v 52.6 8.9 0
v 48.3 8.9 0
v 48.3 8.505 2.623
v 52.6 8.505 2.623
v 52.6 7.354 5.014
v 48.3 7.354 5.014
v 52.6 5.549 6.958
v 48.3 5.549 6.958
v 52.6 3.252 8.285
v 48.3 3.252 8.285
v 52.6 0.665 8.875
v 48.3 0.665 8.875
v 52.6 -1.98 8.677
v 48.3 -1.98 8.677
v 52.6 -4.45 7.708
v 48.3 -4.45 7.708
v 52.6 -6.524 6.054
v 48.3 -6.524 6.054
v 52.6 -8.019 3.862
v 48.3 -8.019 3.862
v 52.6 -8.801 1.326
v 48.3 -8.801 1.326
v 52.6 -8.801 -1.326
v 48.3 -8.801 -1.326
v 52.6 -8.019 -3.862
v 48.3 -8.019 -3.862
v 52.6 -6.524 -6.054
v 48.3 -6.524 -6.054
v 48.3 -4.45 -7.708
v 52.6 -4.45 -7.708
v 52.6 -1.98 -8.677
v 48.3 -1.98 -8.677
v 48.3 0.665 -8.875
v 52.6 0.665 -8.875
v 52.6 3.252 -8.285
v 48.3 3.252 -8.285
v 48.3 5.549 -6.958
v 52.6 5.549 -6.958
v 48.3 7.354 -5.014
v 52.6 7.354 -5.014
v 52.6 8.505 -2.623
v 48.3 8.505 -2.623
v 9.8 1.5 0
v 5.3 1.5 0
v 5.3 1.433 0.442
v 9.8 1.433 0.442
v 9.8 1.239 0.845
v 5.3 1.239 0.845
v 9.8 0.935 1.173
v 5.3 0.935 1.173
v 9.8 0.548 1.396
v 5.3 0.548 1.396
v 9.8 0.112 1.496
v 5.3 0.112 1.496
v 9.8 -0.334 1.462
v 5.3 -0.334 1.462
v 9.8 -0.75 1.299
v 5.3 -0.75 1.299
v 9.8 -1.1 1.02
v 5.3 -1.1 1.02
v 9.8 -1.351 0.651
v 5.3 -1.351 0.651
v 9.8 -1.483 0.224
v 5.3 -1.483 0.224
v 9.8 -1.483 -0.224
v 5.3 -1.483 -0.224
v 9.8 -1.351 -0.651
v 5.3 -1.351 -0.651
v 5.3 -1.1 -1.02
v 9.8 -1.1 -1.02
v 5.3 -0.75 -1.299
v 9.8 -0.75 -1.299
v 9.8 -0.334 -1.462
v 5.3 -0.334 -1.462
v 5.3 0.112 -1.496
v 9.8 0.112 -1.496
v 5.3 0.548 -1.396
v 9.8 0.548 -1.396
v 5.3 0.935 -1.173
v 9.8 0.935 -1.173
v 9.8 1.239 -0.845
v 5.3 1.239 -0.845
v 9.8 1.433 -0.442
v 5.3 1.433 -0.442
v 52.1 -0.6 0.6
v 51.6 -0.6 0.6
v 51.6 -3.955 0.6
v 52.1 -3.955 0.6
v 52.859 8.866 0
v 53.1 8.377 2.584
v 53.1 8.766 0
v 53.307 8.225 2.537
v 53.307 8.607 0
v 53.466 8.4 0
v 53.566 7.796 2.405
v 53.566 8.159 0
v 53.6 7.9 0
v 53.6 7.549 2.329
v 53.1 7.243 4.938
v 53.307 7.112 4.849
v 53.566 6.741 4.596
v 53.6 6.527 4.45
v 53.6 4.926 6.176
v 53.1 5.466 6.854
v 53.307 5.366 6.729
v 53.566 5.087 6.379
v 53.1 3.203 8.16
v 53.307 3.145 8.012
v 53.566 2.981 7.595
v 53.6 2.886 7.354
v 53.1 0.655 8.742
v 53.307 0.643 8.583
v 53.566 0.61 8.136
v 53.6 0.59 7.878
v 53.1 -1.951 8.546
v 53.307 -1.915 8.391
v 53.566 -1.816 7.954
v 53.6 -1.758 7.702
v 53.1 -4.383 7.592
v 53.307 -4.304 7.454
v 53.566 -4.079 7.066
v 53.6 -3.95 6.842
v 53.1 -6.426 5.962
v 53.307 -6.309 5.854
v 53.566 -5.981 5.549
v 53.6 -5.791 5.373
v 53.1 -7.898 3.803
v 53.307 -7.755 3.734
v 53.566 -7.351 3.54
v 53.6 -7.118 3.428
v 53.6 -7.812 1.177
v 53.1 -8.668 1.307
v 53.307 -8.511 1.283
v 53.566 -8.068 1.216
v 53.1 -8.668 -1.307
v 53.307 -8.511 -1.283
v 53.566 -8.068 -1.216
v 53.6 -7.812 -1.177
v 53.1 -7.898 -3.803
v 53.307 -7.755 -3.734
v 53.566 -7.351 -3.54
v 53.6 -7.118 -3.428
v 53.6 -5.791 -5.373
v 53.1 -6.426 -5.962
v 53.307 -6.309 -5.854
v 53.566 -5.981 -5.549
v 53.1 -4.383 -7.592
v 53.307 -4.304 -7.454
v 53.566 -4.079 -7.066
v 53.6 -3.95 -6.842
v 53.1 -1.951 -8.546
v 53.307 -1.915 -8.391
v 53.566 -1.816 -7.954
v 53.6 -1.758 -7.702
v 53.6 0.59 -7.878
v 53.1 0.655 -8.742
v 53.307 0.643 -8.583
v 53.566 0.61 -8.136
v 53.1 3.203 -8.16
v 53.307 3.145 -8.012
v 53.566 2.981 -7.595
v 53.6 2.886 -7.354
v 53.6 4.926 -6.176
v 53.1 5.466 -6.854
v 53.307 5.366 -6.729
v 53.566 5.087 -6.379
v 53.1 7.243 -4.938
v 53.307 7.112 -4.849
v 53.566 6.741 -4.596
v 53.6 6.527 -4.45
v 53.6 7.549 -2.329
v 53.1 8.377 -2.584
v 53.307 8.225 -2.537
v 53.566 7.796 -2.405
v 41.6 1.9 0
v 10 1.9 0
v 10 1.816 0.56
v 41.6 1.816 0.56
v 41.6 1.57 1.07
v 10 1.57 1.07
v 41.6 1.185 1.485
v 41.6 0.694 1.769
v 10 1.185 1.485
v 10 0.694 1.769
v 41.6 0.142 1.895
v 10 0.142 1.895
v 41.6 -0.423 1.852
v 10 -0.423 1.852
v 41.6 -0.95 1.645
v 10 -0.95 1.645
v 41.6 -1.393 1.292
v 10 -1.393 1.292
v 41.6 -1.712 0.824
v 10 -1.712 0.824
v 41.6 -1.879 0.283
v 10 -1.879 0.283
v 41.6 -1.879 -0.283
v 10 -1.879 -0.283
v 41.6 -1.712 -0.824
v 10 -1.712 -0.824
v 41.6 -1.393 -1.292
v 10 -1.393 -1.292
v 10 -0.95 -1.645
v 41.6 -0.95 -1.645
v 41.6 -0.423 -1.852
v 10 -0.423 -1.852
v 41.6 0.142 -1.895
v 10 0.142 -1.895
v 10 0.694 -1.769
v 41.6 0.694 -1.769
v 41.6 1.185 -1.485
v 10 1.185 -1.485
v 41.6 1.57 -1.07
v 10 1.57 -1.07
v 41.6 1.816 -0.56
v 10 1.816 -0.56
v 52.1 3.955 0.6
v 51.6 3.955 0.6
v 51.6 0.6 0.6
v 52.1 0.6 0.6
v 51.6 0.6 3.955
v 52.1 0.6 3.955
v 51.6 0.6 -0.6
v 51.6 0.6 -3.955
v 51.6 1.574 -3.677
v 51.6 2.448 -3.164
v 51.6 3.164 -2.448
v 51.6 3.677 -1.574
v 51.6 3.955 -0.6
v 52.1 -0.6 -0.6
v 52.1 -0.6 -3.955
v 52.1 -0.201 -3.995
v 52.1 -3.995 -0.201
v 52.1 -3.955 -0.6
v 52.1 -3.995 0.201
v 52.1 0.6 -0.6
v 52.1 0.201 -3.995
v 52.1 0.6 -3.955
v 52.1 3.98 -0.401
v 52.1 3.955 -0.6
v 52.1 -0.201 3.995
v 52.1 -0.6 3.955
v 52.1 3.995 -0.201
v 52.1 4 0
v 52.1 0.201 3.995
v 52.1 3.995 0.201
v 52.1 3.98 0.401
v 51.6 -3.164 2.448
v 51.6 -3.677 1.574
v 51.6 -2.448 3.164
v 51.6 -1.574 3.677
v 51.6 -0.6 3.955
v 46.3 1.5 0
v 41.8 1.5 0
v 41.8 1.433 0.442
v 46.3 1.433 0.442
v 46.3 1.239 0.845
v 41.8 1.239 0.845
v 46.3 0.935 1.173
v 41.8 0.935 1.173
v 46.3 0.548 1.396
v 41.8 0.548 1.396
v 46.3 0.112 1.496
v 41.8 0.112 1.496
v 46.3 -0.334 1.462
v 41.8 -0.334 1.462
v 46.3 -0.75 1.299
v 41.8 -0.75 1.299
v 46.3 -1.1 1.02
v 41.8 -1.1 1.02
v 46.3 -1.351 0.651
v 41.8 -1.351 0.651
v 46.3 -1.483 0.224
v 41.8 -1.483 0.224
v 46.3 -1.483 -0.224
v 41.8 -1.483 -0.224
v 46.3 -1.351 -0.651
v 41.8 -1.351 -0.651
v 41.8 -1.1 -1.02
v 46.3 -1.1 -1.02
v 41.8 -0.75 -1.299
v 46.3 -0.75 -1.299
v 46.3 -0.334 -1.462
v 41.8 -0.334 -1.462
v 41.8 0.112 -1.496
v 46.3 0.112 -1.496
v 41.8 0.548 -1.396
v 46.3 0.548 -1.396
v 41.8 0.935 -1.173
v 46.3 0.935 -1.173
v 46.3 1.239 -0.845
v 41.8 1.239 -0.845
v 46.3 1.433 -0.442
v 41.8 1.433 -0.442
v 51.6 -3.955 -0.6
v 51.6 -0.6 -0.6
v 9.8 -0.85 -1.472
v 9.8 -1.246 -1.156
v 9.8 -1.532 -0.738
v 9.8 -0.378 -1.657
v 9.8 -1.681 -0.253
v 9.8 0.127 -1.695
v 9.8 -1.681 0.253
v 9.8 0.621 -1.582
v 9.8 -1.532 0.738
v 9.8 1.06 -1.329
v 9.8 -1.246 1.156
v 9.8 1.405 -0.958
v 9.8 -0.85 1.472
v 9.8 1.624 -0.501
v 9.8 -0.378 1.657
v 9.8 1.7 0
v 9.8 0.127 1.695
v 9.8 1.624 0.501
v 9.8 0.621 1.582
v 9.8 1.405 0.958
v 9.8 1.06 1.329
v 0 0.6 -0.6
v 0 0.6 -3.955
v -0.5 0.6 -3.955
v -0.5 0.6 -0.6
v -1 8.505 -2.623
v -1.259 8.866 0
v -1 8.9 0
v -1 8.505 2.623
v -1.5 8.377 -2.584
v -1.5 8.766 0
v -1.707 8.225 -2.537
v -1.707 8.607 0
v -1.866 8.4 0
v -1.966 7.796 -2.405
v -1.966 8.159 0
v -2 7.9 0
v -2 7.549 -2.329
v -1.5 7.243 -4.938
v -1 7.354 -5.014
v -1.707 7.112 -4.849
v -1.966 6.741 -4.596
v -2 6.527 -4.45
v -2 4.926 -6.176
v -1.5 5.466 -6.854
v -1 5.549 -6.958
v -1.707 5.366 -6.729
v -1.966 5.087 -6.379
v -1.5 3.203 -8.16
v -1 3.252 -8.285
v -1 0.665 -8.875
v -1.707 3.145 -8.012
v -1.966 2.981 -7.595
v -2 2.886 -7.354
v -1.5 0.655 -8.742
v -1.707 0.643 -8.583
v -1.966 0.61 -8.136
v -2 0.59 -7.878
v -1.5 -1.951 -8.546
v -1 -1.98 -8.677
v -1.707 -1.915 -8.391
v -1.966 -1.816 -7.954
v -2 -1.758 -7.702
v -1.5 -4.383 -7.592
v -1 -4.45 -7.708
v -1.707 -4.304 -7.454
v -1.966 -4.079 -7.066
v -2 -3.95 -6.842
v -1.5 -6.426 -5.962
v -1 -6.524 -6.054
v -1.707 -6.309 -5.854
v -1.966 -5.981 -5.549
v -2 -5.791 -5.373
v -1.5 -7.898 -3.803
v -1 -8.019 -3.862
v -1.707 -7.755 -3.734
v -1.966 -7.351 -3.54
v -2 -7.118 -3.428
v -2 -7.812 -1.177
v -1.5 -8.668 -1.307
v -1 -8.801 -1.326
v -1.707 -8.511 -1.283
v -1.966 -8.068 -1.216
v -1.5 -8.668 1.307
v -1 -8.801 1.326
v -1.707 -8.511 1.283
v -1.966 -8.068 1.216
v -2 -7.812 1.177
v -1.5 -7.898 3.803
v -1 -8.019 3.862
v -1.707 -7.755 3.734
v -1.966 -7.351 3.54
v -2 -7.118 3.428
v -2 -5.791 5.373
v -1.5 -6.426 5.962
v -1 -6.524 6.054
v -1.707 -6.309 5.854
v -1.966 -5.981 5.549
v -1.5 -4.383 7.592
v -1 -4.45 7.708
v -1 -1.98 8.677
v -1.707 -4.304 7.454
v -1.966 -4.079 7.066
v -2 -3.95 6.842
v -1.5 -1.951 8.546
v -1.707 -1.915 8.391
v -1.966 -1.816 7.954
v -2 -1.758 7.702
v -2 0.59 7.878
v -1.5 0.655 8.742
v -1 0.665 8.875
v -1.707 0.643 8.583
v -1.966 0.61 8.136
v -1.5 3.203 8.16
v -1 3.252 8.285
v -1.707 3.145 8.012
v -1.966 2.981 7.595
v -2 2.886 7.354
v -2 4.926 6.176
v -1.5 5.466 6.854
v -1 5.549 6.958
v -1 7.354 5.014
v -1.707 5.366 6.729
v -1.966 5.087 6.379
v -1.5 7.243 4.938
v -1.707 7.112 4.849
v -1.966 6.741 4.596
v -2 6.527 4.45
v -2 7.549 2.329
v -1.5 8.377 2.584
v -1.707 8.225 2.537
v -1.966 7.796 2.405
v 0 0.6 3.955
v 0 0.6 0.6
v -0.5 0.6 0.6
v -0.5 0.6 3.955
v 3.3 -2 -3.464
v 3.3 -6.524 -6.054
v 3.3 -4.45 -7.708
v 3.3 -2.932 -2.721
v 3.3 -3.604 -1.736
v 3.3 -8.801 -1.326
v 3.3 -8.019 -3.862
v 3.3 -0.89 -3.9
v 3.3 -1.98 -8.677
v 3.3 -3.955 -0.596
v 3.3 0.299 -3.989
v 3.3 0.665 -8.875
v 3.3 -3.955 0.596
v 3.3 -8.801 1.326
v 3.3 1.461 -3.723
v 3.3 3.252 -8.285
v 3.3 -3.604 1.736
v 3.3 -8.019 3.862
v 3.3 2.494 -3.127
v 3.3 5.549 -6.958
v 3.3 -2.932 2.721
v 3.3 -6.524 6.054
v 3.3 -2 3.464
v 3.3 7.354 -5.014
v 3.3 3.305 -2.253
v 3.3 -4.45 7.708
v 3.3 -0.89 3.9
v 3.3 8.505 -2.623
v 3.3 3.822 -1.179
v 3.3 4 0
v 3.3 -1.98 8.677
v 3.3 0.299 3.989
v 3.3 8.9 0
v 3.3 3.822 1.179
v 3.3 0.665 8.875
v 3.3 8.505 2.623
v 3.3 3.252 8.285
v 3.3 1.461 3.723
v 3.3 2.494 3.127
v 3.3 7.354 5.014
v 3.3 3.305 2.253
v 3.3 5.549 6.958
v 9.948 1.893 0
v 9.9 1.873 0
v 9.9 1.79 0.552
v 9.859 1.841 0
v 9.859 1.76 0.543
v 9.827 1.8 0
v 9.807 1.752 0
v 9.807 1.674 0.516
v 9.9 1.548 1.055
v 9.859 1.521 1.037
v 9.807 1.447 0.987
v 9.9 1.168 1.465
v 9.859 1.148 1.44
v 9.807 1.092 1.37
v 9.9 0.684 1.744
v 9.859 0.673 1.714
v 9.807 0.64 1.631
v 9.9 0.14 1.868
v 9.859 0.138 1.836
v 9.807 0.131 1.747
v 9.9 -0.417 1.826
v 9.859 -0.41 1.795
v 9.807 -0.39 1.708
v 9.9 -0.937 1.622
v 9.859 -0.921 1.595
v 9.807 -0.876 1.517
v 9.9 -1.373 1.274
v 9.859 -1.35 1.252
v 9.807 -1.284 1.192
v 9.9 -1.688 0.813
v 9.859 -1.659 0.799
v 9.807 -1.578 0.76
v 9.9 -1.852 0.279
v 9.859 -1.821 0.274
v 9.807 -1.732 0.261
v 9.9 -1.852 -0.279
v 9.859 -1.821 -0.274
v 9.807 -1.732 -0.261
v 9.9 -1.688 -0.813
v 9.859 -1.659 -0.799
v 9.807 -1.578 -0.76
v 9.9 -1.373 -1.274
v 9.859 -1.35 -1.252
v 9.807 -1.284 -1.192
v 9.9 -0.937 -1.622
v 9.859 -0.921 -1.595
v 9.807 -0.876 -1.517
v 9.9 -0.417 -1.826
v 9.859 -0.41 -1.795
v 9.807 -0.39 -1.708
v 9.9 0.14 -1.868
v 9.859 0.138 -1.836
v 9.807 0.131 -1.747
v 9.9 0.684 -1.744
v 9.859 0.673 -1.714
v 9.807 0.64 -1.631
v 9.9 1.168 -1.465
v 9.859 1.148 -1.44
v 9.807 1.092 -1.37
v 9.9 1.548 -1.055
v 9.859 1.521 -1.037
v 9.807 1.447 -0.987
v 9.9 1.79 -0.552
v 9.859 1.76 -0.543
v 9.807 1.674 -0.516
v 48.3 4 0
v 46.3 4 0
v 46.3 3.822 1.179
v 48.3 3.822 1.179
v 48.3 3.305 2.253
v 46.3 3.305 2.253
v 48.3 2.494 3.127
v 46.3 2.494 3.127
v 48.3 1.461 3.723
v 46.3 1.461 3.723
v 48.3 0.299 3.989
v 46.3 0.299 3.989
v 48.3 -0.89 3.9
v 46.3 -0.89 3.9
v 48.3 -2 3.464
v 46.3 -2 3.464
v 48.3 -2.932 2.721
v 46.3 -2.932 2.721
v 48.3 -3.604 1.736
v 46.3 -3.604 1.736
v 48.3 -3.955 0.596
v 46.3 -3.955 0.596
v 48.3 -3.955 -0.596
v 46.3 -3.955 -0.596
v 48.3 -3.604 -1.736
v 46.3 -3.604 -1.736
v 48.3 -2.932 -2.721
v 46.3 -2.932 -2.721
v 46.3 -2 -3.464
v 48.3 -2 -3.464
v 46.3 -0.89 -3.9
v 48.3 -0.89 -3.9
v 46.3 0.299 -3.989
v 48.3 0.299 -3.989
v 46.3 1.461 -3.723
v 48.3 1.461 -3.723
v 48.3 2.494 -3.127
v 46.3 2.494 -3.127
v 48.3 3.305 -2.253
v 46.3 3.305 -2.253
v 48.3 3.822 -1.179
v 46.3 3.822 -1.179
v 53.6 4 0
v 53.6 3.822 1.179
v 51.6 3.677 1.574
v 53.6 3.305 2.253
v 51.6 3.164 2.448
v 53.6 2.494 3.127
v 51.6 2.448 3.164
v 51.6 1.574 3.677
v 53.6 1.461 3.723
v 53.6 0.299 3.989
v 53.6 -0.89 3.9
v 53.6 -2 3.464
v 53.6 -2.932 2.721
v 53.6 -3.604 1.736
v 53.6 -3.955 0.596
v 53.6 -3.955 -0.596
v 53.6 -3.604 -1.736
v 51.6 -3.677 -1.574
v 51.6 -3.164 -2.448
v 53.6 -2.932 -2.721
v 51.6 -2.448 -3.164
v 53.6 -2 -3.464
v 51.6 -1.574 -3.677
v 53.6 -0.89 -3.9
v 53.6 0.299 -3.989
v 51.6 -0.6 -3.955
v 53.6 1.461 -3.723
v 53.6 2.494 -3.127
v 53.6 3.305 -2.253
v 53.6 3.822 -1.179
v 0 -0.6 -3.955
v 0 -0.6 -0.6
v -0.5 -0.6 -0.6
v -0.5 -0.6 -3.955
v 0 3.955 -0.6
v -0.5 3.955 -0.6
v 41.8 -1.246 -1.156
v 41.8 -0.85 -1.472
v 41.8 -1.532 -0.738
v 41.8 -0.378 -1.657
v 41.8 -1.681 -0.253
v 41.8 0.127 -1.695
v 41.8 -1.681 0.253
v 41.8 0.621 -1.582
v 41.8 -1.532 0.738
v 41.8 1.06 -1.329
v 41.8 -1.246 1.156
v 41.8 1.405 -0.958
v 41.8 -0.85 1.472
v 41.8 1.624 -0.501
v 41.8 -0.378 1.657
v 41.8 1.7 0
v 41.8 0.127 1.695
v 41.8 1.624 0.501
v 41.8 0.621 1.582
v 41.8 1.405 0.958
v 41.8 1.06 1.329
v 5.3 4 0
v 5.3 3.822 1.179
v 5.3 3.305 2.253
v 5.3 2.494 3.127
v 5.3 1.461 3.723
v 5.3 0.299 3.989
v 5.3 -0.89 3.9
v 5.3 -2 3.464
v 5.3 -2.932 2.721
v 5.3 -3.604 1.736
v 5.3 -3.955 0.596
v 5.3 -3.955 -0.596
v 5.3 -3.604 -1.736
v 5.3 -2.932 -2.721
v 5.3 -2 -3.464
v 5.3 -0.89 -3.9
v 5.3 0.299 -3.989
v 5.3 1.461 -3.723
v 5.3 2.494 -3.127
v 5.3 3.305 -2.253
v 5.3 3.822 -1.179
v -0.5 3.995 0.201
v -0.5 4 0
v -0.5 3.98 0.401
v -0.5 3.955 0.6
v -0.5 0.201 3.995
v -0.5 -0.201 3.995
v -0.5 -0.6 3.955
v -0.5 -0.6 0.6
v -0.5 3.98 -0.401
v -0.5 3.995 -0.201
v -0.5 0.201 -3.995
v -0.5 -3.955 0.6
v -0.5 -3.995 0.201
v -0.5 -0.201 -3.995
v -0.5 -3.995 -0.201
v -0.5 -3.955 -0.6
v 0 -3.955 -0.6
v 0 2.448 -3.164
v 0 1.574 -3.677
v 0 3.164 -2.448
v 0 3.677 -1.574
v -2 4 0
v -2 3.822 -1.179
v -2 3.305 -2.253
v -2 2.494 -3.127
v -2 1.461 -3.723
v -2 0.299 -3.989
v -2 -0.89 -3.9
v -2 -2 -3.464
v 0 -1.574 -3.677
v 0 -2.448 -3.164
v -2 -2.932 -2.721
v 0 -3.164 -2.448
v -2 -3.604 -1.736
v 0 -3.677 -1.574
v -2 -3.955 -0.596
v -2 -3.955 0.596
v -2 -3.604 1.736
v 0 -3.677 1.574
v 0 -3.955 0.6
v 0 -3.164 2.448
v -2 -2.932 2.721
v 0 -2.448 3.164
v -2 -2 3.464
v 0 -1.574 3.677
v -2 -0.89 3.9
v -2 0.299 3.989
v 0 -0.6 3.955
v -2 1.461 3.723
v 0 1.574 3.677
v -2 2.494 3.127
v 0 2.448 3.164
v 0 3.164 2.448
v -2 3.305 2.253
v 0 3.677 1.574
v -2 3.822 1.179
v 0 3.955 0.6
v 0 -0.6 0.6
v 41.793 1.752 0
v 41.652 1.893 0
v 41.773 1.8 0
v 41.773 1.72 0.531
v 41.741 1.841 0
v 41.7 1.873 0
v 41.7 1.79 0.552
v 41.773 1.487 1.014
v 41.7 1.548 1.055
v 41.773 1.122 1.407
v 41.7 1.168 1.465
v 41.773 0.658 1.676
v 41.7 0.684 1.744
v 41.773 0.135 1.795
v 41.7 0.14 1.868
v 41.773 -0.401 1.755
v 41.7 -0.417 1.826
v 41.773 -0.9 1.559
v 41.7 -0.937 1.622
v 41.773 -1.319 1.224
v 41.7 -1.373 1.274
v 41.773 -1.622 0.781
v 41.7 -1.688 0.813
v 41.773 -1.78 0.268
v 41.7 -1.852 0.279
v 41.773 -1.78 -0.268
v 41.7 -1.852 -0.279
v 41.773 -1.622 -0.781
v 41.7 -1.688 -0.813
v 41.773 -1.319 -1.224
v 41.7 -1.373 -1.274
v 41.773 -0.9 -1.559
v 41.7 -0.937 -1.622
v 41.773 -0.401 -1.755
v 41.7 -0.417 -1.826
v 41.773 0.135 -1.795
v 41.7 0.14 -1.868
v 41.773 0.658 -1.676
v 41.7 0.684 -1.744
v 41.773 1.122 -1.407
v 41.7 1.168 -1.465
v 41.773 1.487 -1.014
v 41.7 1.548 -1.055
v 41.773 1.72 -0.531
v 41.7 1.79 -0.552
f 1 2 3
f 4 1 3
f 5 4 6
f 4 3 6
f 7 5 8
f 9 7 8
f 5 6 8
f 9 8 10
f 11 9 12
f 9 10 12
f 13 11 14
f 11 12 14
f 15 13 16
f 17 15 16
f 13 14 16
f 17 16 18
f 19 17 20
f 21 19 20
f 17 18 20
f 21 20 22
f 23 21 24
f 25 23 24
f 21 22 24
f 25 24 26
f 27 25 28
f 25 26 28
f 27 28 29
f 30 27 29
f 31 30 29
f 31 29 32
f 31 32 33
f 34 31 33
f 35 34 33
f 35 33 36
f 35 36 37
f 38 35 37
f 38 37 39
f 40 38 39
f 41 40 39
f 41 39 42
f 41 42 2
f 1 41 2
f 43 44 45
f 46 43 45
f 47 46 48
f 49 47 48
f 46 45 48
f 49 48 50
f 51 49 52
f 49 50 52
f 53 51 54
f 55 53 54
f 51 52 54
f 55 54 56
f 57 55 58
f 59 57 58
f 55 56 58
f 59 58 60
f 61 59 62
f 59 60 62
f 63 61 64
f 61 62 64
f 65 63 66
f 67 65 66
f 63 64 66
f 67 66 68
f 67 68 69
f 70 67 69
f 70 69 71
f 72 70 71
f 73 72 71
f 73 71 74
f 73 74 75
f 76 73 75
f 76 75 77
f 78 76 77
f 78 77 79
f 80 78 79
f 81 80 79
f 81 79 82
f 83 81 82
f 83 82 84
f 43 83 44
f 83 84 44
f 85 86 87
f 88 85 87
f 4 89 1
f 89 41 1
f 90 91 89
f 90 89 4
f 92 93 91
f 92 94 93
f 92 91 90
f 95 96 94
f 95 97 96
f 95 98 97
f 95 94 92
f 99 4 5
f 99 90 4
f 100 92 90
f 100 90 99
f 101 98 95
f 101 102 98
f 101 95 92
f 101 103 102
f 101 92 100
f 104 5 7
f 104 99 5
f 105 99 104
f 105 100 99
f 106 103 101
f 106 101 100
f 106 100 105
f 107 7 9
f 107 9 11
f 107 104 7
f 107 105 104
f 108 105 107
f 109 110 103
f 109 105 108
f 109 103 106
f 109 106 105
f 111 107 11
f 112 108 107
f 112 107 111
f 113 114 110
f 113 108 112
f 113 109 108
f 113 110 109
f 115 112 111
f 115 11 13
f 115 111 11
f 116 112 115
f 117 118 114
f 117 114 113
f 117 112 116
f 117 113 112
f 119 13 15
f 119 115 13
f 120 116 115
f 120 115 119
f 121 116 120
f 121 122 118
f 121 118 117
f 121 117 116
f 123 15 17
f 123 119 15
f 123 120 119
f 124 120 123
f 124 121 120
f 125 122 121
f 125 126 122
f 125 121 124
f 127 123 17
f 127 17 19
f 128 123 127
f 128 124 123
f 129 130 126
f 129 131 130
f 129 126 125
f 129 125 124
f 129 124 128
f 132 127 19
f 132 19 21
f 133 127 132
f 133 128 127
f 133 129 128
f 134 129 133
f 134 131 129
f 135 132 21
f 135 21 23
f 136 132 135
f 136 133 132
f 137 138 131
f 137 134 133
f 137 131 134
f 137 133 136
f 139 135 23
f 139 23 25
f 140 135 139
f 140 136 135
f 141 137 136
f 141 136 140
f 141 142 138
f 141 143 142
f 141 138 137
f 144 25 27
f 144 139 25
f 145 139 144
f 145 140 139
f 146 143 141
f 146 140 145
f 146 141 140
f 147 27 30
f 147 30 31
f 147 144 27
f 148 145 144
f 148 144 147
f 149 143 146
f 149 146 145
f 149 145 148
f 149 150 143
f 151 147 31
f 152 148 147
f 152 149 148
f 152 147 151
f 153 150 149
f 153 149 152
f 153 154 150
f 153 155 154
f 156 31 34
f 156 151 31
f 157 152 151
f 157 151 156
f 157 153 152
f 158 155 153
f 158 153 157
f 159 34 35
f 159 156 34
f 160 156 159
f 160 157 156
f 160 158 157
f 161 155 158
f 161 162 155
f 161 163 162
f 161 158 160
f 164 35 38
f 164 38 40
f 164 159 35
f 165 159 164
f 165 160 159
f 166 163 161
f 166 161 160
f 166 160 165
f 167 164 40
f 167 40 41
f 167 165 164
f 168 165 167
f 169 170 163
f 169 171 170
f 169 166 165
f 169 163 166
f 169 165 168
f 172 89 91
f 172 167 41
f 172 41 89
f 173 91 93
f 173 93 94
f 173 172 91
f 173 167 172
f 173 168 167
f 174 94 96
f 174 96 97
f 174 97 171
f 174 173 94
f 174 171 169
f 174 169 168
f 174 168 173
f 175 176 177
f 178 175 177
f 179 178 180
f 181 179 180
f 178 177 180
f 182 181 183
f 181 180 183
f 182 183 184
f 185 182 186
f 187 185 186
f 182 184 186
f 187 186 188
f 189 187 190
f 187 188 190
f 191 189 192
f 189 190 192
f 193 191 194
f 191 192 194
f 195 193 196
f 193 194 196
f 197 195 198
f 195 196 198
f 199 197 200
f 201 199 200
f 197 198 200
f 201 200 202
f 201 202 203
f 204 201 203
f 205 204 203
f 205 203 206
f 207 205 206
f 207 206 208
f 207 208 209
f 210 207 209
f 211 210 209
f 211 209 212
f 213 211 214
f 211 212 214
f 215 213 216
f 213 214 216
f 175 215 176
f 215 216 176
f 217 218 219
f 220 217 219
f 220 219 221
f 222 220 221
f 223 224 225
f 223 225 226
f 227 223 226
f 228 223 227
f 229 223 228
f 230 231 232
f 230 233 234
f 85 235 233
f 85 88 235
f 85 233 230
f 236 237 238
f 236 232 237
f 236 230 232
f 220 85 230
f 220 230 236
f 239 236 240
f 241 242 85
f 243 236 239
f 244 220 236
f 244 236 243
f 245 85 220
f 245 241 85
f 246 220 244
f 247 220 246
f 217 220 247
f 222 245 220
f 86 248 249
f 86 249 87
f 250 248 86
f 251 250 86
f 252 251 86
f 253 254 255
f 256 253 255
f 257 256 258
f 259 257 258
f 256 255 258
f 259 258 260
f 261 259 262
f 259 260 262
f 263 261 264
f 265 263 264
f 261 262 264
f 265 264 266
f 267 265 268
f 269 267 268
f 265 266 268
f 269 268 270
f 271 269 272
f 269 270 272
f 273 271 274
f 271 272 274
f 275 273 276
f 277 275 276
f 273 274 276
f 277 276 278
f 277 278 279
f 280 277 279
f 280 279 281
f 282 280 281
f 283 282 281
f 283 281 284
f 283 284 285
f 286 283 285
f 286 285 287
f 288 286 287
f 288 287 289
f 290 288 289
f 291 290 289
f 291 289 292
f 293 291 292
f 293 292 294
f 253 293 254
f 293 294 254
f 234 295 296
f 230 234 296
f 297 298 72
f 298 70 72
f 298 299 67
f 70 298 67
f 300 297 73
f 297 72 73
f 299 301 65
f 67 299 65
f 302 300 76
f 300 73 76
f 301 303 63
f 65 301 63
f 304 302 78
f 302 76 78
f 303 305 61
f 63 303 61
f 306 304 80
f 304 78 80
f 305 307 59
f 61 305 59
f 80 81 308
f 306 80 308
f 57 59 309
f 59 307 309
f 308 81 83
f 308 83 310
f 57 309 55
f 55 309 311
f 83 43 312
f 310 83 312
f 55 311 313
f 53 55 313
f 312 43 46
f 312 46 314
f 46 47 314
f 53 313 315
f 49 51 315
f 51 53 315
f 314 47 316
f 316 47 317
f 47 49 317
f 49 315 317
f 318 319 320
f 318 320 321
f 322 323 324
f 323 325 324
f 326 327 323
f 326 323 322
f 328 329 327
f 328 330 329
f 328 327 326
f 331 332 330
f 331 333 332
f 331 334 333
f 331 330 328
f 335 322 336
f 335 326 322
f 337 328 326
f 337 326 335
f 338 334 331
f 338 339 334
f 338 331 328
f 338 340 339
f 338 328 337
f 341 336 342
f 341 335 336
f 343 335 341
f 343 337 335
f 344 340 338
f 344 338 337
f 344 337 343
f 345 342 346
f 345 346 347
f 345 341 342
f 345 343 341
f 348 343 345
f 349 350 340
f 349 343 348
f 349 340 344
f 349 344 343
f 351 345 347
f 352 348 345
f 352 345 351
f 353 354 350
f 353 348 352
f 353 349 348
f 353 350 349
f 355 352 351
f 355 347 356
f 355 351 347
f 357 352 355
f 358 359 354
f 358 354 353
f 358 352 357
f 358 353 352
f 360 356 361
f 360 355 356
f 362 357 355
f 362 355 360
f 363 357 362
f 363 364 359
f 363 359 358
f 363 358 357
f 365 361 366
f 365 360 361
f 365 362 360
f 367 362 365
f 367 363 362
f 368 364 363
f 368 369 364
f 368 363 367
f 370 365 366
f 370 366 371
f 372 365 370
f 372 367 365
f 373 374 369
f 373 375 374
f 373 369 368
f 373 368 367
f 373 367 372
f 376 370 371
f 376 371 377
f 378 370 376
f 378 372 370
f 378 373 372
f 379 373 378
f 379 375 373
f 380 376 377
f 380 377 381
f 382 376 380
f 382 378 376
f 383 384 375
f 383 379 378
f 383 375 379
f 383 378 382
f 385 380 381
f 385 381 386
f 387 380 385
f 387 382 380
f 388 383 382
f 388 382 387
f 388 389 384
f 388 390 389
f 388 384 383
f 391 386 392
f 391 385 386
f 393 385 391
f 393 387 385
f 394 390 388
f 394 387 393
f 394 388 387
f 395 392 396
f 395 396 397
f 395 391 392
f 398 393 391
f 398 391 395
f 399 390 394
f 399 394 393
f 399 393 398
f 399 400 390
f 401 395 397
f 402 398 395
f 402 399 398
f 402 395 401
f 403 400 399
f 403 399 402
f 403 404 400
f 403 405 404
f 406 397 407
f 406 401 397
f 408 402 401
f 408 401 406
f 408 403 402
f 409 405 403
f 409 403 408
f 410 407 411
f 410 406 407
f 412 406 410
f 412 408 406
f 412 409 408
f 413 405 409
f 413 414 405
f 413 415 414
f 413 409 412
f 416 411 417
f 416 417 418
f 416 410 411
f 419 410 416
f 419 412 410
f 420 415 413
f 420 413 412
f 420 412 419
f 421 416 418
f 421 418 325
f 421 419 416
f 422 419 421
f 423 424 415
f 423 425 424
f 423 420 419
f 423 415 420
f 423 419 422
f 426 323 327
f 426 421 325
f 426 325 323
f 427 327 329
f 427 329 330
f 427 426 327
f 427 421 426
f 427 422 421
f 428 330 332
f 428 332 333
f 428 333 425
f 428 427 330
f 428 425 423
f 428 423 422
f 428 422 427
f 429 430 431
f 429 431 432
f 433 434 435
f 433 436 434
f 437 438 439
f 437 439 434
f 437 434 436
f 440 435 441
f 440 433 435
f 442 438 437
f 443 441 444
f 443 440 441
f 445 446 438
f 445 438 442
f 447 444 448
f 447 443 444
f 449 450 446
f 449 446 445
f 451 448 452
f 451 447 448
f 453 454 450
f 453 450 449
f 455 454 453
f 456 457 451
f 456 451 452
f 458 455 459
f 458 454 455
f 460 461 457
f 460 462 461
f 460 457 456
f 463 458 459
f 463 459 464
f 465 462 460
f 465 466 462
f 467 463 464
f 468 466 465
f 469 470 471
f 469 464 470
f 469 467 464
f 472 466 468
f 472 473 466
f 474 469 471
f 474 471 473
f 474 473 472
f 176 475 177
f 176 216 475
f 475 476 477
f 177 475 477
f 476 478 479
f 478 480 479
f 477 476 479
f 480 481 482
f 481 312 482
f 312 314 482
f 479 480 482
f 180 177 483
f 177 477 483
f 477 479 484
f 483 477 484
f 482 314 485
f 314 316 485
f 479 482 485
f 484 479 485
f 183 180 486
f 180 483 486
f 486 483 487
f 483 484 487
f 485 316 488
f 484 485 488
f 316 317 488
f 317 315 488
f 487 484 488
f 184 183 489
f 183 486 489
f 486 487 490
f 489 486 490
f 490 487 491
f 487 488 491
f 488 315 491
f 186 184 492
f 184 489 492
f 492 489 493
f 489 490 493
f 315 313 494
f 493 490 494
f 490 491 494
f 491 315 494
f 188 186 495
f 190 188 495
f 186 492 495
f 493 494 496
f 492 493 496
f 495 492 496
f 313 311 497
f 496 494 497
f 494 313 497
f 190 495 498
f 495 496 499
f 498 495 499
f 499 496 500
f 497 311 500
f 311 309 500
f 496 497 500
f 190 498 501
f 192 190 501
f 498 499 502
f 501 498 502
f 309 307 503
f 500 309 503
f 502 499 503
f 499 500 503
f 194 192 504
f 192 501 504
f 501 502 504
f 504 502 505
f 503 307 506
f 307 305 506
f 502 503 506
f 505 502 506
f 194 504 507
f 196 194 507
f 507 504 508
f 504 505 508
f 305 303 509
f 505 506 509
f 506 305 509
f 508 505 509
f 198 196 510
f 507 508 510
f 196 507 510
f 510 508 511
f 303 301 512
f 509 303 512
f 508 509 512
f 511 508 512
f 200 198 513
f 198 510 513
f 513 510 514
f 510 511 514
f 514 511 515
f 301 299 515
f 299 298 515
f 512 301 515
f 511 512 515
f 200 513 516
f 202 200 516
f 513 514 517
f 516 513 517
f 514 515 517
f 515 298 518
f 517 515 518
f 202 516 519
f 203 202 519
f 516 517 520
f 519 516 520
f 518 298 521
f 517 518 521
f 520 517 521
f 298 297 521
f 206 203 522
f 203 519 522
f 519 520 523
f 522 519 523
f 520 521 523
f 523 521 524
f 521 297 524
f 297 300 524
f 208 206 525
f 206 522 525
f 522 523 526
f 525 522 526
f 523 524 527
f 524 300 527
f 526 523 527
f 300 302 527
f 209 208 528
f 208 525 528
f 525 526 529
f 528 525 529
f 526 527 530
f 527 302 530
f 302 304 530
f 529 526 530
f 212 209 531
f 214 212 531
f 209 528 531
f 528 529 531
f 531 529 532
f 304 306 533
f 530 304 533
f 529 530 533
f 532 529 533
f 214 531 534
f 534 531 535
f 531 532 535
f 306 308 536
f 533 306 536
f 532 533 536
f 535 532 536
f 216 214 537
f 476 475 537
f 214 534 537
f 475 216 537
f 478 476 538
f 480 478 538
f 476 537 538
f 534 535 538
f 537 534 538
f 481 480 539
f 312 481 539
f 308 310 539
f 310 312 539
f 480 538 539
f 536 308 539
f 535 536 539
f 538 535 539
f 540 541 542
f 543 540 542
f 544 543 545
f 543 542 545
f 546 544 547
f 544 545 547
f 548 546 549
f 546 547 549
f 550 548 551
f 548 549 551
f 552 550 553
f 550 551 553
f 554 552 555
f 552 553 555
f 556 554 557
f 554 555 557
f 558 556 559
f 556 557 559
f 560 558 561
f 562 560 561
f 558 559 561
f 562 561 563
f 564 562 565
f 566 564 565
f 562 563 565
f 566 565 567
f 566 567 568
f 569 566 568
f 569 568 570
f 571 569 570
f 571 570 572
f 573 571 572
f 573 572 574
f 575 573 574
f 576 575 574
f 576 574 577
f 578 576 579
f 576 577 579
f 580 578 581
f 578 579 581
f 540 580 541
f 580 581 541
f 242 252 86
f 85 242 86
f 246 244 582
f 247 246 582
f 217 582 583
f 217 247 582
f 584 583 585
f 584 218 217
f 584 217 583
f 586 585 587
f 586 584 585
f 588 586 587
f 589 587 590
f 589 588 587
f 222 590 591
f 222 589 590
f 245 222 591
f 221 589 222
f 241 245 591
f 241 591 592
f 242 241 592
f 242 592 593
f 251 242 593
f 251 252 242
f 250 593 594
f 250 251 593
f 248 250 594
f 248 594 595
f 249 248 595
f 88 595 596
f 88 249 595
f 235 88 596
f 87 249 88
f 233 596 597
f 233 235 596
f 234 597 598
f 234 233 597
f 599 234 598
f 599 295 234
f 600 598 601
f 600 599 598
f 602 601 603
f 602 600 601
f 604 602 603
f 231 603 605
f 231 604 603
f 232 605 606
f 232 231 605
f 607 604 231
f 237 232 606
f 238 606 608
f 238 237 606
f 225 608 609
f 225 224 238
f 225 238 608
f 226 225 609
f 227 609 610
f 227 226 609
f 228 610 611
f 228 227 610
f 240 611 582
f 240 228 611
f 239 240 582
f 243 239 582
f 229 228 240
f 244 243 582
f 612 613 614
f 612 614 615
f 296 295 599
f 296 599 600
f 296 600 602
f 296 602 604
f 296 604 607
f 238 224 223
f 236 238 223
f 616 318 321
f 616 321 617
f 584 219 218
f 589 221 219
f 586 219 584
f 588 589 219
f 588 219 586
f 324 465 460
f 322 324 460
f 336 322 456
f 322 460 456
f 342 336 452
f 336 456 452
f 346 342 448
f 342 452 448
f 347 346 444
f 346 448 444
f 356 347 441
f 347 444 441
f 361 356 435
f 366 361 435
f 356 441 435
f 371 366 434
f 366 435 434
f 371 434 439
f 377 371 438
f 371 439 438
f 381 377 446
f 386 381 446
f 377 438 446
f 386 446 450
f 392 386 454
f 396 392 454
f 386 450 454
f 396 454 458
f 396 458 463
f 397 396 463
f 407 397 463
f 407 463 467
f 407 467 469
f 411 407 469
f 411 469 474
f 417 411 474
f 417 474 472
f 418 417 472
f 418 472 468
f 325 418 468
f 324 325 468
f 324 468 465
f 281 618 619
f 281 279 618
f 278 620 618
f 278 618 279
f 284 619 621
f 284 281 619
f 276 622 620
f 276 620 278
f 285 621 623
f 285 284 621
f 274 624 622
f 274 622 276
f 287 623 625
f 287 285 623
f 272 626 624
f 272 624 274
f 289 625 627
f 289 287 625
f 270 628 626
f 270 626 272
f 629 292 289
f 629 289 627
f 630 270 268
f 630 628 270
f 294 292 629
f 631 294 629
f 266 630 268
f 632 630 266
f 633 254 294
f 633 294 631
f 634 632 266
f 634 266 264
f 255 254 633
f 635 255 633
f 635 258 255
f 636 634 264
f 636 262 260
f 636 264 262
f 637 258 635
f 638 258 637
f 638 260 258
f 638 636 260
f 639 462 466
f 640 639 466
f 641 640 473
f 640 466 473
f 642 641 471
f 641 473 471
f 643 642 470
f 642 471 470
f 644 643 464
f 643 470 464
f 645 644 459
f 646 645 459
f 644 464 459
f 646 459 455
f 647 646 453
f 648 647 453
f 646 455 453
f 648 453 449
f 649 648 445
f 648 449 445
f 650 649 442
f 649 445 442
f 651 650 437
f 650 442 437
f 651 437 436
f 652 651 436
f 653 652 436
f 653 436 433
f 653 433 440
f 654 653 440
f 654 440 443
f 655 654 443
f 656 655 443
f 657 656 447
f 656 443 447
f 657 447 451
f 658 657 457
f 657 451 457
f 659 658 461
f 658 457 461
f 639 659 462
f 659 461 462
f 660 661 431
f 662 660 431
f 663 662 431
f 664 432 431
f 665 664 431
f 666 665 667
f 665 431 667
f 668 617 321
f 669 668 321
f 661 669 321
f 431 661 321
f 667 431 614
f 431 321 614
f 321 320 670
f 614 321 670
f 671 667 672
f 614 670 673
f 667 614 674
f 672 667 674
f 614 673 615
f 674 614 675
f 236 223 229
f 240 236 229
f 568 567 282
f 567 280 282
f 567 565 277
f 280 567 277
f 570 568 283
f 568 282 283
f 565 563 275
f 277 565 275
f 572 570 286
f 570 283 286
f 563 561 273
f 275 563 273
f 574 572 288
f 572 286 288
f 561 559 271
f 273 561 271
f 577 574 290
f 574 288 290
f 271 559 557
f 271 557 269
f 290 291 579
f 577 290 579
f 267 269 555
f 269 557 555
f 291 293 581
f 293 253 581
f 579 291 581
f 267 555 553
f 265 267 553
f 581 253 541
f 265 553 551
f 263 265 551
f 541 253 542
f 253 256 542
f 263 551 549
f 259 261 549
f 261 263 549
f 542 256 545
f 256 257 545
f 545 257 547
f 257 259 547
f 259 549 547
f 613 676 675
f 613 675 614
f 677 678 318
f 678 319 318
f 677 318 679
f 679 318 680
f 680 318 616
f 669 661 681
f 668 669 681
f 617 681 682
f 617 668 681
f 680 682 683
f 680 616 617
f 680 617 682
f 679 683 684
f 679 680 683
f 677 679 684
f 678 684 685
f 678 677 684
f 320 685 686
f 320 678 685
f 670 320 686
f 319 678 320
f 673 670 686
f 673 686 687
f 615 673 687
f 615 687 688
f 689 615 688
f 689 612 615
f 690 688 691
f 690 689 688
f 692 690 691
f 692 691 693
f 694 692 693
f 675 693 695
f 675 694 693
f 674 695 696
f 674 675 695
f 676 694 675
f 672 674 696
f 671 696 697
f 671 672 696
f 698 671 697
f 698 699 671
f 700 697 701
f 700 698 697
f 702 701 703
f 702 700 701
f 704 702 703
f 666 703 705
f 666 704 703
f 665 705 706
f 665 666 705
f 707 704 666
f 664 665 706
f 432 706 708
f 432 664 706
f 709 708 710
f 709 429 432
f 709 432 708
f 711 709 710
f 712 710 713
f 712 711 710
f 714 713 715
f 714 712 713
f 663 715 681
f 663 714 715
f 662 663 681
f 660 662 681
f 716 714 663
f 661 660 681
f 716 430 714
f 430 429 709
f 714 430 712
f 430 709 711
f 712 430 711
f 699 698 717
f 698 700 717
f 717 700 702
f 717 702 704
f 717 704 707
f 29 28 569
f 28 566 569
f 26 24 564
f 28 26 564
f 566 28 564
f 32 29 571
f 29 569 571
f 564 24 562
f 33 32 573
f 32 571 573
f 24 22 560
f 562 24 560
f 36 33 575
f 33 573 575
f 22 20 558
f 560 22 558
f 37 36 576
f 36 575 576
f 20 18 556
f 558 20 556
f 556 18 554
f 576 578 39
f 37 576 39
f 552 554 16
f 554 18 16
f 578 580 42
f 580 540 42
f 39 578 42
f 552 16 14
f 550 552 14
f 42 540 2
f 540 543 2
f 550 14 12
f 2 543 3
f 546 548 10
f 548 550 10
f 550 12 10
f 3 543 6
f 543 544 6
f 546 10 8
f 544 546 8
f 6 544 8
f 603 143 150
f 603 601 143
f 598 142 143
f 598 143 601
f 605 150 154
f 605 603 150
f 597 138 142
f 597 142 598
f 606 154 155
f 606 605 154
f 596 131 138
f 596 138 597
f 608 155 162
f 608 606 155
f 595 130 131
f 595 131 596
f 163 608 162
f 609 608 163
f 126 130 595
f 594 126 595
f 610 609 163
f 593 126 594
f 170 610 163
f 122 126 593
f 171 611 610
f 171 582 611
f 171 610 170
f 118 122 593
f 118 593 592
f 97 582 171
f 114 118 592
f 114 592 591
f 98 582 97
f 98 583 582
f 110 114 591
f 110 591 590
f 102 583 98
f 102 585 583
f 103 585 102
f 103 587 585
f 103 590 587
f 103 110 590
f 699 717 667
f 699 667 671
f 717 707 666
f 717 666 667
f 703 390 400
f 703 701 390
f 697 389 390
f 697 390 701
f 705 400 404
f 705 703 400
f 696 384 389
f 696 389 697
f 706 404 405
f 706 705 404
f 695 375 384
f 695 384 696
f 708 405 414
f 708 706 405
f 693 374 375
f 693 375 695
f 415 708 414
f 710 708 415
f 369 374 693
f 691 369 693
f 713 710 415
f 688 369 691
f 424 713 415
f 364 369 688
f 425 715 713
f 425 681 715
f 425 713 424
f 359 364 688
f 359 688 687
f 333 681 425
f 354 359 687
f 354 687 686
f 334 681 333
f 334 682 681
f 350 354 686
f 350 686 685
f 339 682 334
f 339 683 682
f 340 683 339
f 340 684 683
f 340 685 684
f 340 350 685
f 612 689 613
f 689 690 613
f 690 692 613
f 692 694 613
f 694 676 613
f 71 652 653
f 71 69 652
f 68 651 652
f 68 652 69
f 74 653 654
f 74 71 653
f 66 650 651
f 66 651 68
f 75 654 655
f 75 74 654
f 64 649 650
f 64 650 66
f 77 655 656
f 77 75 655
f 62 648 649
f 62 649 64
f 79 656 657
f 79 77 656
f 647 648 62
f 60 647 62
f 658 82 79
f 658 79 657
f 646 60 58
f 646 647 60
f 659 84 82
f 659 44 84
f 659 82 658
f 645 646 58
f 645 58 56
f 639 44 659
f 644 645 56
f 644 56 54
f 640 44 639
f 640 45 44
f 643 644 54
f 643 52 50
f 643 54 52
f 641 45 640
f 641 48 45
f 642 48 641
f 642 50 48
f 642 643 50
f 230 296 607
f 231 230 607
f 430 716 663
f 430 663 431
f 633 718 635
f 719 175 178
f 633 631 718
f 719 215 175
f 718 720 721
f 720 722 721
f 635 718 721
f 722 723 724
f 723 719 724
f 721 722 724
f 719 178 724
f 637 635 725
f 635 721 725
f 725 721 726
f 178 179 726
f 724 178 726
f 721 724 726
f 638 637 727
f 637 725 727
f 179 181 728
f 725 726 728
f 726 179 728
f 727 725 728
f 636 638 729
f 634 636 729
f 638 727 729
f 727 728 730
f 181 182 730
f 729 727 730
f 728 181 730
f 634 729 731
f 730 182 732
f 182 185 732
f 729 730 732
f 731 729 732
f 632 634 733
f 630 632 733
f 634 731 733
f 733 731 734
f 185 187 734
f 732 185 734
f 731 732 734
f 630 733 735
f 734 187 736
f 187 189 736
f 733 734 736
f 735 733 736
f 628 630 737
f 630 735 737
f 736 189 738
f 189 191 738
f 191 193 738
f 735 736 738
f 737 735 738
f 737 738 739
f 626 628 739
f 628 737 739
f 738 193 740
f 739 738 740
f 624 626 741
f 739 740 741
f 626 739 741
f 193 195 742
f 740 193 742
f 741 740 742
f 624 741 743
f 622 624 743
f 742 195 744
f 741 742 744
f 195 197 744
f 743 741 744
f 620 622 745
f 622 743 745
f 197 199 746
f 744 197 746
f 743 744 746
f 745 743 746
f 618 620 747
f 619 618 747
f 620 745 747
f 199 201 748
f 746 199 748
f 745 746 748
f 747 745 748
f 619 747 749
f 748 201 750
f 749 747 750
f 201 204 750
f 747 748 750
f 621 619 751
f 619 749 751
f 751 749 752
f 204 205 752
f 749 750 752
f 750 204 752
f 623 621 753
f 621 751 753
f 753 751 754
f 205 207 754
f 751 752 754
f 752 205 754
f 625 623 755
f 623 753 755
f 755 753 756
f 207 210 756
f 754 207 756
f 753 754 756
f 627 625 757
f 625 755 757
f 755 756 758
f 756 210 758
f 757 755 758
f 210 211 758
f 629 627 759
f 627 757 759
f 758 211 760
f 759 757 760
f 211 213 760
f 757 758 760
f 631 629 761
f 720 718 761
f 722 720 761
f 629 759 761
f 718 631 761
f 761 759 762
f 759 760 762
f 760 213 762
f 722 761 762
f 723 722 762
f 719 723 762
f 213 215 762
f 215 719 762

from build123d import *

# Parameters (mm, degrees)
SKETCH_R      = 8.9
PAD_DEPTH     = 3.3
SKETCH001_R   = 8.9
SKETCH001_R_2 = 4
PAD001_DEPTH  = 2
SKETCH003_R   = 4
PAD002_DEPTH  = 2
SKETCH004_R   = 1.5
PAD003_DEPTH  = 4.5
SKETCH005_R   = 1.9
PAD004_DEPTH  = 32
FILLET_R      = 1
SKETCH006_R   = 1.5
PAD005_DEPTH  = 4.5
SKETCH007_R   = 4
PAD006_DEPTH  = 2
SKETCH008_R   = 8.9
PAD007_DEPTH  = 3.3
SKETCH009_R   = 8.9
SKETCH009_R_2 = 4
PAD008_DEPTH  = 2
FILLET001_R   = 1
FILLET002_R   = 0.2
FILLET003_R   = 0.2
PAD009_DEPTH  = 0.5
PAD010_DEPTH  = 0.5


with BuildPart() as part:
    # Sketch → Pad (new body)
    with BuildSketch(Plane.YZ):
        Circle(SKETCH_R)
    extrude(amount=PAD_DEPTH)

    # Sketch001 (on Face2 of Pad) → Pad001 (join)
    with BuildSketch(Plane(origin=(0, 0, 0), x_dir=(0, 1, 0), z_dir=(-1, 0, 0))):
        Circle(SKETCH001_R)
        Circle(SKETCH001_R_2, mode=Mode.SUBTRACT)
    extrude(amount=PAD001_DEPTH)

    # Sketch003 (on Face3 of Pad001) → Pad002 (join)
    with BuildSketch(Plane.YZ.offset(3.3)):
        Circle(SKETCH003_R)
    extrude(amount=PAD002_DEPTH)

    # Sketch004 (on Face7 of Pad002) → Pad003 (join)
    with BuildSketch(Plane.YZ.offset(5.3)):
        Circle(SKETCH004_R)
    extrude(amount=PAD003_DEPTH)

    # Sketch005 (on Face10 of Pad003) → Pad004 (join)
    with BuildSketch(Plane.YZ.offset(9.8)):
        Circle(SKETCH005_R)
    extrude(amount=PAD004_DEPTH)

    # Fillet
    fillet_edges = [part.edges().sort_by_distance(p)[0] for p in [
        (-2, -8.9, 0),
    ]]
    fillet(fillet_edges, radius=FILLET_R)

    # Sketch006 (on Face13 of Fillet) → Pad005 (join)
    with BuildSketch(Plane.YZ.offset(41.8)):
        Circle(SKETCH006_R)
    extrude(amount=PAD005_DEPTH)

    # Sketch007 (on Face15 of Pad005) → Pad006 (join)
    with BuildSketch(Plane.YZ.offset(46.3)):
        Circle(SKETCH007_R)
    extrude(amount=PAD006_DEPTH)

    # Sketch008 (on Face3 of Pad006) → Pad007 (join)
    with BuildSketch(Plane.YZ.offset(48.3)):
        Circle(SKETCH008_R)
    extrude(amount=PAD007_DEPTH)

    # Sketch009 (on Face3 of Pad007) → Pad008 (join)
    with BuildSketch(Plane.YZ.offset(51.6)):
        Circle(SKETCH009_R)
        Circle(SKETCH009_R_2, mode=Mode.SUBTRACT)
    extrude(amount=PAD008_DEPTH)

    # Fillet001
    fillet001_edges = [part.edges().sort_by_distance(p)[0] for p in [
        (53.6, -8.9, 0),
    ]]
    fillet(fillet001_edges, radius=FILLET001_R)

    # Fillet002
    fillet002_edges = [part.edges().sort_by_distance(p)[0] for p in [
        (41.8, -1.9, 0),
    ]]
    fillet(fillet002_edges, radius=FILLET002_R)

    # Fillet003
    fillet003_edges = [part.edges().sort_by_distance(p)[0] for p in [
        (9.8, -1.9, 0),
    ]]
    fillet(fillet003_edges, radius=FILLET003_R)

    # Sketch010 (on Face24 of Fillet003) → Pad009 (join)
    with BuildSketch(Plane(origin=(0, 0, 0), x_dir=(0, 1, 0), z_dir=(-1, 0, 0))):
        Polygon((-0.6, 0.6), (-0.6, 4), (0.6, 4), (0.6, 0.6), (4, 0.6), (4, -0.6), (0.6, -0.6), (0.6, -4), (-0.6, -4), (-0.6, -0.6), (-4, -0.6), (-4, 0.6), align=None)
    extrude(amount=PAD009_DEPTH)

    # Sketch011 (on Face37 of Pad009) → Pad010 (join)
    with BuildSketch(Plane.YZ.offset(51.6)):
        Polygon((-0.6, -0.6), (-0.6, -4), (0.6, -4), (0.6, -0.6), (4, -0.6), (4, 0.6), (0.6, 0.6), (0.6, 4), (-0.6, 4), (-0.6, 0.6), (-4, 0.6), (-4, -0.6), align=None)
    extrude(amount=PAD010_DEPTH)


solid = part.part
